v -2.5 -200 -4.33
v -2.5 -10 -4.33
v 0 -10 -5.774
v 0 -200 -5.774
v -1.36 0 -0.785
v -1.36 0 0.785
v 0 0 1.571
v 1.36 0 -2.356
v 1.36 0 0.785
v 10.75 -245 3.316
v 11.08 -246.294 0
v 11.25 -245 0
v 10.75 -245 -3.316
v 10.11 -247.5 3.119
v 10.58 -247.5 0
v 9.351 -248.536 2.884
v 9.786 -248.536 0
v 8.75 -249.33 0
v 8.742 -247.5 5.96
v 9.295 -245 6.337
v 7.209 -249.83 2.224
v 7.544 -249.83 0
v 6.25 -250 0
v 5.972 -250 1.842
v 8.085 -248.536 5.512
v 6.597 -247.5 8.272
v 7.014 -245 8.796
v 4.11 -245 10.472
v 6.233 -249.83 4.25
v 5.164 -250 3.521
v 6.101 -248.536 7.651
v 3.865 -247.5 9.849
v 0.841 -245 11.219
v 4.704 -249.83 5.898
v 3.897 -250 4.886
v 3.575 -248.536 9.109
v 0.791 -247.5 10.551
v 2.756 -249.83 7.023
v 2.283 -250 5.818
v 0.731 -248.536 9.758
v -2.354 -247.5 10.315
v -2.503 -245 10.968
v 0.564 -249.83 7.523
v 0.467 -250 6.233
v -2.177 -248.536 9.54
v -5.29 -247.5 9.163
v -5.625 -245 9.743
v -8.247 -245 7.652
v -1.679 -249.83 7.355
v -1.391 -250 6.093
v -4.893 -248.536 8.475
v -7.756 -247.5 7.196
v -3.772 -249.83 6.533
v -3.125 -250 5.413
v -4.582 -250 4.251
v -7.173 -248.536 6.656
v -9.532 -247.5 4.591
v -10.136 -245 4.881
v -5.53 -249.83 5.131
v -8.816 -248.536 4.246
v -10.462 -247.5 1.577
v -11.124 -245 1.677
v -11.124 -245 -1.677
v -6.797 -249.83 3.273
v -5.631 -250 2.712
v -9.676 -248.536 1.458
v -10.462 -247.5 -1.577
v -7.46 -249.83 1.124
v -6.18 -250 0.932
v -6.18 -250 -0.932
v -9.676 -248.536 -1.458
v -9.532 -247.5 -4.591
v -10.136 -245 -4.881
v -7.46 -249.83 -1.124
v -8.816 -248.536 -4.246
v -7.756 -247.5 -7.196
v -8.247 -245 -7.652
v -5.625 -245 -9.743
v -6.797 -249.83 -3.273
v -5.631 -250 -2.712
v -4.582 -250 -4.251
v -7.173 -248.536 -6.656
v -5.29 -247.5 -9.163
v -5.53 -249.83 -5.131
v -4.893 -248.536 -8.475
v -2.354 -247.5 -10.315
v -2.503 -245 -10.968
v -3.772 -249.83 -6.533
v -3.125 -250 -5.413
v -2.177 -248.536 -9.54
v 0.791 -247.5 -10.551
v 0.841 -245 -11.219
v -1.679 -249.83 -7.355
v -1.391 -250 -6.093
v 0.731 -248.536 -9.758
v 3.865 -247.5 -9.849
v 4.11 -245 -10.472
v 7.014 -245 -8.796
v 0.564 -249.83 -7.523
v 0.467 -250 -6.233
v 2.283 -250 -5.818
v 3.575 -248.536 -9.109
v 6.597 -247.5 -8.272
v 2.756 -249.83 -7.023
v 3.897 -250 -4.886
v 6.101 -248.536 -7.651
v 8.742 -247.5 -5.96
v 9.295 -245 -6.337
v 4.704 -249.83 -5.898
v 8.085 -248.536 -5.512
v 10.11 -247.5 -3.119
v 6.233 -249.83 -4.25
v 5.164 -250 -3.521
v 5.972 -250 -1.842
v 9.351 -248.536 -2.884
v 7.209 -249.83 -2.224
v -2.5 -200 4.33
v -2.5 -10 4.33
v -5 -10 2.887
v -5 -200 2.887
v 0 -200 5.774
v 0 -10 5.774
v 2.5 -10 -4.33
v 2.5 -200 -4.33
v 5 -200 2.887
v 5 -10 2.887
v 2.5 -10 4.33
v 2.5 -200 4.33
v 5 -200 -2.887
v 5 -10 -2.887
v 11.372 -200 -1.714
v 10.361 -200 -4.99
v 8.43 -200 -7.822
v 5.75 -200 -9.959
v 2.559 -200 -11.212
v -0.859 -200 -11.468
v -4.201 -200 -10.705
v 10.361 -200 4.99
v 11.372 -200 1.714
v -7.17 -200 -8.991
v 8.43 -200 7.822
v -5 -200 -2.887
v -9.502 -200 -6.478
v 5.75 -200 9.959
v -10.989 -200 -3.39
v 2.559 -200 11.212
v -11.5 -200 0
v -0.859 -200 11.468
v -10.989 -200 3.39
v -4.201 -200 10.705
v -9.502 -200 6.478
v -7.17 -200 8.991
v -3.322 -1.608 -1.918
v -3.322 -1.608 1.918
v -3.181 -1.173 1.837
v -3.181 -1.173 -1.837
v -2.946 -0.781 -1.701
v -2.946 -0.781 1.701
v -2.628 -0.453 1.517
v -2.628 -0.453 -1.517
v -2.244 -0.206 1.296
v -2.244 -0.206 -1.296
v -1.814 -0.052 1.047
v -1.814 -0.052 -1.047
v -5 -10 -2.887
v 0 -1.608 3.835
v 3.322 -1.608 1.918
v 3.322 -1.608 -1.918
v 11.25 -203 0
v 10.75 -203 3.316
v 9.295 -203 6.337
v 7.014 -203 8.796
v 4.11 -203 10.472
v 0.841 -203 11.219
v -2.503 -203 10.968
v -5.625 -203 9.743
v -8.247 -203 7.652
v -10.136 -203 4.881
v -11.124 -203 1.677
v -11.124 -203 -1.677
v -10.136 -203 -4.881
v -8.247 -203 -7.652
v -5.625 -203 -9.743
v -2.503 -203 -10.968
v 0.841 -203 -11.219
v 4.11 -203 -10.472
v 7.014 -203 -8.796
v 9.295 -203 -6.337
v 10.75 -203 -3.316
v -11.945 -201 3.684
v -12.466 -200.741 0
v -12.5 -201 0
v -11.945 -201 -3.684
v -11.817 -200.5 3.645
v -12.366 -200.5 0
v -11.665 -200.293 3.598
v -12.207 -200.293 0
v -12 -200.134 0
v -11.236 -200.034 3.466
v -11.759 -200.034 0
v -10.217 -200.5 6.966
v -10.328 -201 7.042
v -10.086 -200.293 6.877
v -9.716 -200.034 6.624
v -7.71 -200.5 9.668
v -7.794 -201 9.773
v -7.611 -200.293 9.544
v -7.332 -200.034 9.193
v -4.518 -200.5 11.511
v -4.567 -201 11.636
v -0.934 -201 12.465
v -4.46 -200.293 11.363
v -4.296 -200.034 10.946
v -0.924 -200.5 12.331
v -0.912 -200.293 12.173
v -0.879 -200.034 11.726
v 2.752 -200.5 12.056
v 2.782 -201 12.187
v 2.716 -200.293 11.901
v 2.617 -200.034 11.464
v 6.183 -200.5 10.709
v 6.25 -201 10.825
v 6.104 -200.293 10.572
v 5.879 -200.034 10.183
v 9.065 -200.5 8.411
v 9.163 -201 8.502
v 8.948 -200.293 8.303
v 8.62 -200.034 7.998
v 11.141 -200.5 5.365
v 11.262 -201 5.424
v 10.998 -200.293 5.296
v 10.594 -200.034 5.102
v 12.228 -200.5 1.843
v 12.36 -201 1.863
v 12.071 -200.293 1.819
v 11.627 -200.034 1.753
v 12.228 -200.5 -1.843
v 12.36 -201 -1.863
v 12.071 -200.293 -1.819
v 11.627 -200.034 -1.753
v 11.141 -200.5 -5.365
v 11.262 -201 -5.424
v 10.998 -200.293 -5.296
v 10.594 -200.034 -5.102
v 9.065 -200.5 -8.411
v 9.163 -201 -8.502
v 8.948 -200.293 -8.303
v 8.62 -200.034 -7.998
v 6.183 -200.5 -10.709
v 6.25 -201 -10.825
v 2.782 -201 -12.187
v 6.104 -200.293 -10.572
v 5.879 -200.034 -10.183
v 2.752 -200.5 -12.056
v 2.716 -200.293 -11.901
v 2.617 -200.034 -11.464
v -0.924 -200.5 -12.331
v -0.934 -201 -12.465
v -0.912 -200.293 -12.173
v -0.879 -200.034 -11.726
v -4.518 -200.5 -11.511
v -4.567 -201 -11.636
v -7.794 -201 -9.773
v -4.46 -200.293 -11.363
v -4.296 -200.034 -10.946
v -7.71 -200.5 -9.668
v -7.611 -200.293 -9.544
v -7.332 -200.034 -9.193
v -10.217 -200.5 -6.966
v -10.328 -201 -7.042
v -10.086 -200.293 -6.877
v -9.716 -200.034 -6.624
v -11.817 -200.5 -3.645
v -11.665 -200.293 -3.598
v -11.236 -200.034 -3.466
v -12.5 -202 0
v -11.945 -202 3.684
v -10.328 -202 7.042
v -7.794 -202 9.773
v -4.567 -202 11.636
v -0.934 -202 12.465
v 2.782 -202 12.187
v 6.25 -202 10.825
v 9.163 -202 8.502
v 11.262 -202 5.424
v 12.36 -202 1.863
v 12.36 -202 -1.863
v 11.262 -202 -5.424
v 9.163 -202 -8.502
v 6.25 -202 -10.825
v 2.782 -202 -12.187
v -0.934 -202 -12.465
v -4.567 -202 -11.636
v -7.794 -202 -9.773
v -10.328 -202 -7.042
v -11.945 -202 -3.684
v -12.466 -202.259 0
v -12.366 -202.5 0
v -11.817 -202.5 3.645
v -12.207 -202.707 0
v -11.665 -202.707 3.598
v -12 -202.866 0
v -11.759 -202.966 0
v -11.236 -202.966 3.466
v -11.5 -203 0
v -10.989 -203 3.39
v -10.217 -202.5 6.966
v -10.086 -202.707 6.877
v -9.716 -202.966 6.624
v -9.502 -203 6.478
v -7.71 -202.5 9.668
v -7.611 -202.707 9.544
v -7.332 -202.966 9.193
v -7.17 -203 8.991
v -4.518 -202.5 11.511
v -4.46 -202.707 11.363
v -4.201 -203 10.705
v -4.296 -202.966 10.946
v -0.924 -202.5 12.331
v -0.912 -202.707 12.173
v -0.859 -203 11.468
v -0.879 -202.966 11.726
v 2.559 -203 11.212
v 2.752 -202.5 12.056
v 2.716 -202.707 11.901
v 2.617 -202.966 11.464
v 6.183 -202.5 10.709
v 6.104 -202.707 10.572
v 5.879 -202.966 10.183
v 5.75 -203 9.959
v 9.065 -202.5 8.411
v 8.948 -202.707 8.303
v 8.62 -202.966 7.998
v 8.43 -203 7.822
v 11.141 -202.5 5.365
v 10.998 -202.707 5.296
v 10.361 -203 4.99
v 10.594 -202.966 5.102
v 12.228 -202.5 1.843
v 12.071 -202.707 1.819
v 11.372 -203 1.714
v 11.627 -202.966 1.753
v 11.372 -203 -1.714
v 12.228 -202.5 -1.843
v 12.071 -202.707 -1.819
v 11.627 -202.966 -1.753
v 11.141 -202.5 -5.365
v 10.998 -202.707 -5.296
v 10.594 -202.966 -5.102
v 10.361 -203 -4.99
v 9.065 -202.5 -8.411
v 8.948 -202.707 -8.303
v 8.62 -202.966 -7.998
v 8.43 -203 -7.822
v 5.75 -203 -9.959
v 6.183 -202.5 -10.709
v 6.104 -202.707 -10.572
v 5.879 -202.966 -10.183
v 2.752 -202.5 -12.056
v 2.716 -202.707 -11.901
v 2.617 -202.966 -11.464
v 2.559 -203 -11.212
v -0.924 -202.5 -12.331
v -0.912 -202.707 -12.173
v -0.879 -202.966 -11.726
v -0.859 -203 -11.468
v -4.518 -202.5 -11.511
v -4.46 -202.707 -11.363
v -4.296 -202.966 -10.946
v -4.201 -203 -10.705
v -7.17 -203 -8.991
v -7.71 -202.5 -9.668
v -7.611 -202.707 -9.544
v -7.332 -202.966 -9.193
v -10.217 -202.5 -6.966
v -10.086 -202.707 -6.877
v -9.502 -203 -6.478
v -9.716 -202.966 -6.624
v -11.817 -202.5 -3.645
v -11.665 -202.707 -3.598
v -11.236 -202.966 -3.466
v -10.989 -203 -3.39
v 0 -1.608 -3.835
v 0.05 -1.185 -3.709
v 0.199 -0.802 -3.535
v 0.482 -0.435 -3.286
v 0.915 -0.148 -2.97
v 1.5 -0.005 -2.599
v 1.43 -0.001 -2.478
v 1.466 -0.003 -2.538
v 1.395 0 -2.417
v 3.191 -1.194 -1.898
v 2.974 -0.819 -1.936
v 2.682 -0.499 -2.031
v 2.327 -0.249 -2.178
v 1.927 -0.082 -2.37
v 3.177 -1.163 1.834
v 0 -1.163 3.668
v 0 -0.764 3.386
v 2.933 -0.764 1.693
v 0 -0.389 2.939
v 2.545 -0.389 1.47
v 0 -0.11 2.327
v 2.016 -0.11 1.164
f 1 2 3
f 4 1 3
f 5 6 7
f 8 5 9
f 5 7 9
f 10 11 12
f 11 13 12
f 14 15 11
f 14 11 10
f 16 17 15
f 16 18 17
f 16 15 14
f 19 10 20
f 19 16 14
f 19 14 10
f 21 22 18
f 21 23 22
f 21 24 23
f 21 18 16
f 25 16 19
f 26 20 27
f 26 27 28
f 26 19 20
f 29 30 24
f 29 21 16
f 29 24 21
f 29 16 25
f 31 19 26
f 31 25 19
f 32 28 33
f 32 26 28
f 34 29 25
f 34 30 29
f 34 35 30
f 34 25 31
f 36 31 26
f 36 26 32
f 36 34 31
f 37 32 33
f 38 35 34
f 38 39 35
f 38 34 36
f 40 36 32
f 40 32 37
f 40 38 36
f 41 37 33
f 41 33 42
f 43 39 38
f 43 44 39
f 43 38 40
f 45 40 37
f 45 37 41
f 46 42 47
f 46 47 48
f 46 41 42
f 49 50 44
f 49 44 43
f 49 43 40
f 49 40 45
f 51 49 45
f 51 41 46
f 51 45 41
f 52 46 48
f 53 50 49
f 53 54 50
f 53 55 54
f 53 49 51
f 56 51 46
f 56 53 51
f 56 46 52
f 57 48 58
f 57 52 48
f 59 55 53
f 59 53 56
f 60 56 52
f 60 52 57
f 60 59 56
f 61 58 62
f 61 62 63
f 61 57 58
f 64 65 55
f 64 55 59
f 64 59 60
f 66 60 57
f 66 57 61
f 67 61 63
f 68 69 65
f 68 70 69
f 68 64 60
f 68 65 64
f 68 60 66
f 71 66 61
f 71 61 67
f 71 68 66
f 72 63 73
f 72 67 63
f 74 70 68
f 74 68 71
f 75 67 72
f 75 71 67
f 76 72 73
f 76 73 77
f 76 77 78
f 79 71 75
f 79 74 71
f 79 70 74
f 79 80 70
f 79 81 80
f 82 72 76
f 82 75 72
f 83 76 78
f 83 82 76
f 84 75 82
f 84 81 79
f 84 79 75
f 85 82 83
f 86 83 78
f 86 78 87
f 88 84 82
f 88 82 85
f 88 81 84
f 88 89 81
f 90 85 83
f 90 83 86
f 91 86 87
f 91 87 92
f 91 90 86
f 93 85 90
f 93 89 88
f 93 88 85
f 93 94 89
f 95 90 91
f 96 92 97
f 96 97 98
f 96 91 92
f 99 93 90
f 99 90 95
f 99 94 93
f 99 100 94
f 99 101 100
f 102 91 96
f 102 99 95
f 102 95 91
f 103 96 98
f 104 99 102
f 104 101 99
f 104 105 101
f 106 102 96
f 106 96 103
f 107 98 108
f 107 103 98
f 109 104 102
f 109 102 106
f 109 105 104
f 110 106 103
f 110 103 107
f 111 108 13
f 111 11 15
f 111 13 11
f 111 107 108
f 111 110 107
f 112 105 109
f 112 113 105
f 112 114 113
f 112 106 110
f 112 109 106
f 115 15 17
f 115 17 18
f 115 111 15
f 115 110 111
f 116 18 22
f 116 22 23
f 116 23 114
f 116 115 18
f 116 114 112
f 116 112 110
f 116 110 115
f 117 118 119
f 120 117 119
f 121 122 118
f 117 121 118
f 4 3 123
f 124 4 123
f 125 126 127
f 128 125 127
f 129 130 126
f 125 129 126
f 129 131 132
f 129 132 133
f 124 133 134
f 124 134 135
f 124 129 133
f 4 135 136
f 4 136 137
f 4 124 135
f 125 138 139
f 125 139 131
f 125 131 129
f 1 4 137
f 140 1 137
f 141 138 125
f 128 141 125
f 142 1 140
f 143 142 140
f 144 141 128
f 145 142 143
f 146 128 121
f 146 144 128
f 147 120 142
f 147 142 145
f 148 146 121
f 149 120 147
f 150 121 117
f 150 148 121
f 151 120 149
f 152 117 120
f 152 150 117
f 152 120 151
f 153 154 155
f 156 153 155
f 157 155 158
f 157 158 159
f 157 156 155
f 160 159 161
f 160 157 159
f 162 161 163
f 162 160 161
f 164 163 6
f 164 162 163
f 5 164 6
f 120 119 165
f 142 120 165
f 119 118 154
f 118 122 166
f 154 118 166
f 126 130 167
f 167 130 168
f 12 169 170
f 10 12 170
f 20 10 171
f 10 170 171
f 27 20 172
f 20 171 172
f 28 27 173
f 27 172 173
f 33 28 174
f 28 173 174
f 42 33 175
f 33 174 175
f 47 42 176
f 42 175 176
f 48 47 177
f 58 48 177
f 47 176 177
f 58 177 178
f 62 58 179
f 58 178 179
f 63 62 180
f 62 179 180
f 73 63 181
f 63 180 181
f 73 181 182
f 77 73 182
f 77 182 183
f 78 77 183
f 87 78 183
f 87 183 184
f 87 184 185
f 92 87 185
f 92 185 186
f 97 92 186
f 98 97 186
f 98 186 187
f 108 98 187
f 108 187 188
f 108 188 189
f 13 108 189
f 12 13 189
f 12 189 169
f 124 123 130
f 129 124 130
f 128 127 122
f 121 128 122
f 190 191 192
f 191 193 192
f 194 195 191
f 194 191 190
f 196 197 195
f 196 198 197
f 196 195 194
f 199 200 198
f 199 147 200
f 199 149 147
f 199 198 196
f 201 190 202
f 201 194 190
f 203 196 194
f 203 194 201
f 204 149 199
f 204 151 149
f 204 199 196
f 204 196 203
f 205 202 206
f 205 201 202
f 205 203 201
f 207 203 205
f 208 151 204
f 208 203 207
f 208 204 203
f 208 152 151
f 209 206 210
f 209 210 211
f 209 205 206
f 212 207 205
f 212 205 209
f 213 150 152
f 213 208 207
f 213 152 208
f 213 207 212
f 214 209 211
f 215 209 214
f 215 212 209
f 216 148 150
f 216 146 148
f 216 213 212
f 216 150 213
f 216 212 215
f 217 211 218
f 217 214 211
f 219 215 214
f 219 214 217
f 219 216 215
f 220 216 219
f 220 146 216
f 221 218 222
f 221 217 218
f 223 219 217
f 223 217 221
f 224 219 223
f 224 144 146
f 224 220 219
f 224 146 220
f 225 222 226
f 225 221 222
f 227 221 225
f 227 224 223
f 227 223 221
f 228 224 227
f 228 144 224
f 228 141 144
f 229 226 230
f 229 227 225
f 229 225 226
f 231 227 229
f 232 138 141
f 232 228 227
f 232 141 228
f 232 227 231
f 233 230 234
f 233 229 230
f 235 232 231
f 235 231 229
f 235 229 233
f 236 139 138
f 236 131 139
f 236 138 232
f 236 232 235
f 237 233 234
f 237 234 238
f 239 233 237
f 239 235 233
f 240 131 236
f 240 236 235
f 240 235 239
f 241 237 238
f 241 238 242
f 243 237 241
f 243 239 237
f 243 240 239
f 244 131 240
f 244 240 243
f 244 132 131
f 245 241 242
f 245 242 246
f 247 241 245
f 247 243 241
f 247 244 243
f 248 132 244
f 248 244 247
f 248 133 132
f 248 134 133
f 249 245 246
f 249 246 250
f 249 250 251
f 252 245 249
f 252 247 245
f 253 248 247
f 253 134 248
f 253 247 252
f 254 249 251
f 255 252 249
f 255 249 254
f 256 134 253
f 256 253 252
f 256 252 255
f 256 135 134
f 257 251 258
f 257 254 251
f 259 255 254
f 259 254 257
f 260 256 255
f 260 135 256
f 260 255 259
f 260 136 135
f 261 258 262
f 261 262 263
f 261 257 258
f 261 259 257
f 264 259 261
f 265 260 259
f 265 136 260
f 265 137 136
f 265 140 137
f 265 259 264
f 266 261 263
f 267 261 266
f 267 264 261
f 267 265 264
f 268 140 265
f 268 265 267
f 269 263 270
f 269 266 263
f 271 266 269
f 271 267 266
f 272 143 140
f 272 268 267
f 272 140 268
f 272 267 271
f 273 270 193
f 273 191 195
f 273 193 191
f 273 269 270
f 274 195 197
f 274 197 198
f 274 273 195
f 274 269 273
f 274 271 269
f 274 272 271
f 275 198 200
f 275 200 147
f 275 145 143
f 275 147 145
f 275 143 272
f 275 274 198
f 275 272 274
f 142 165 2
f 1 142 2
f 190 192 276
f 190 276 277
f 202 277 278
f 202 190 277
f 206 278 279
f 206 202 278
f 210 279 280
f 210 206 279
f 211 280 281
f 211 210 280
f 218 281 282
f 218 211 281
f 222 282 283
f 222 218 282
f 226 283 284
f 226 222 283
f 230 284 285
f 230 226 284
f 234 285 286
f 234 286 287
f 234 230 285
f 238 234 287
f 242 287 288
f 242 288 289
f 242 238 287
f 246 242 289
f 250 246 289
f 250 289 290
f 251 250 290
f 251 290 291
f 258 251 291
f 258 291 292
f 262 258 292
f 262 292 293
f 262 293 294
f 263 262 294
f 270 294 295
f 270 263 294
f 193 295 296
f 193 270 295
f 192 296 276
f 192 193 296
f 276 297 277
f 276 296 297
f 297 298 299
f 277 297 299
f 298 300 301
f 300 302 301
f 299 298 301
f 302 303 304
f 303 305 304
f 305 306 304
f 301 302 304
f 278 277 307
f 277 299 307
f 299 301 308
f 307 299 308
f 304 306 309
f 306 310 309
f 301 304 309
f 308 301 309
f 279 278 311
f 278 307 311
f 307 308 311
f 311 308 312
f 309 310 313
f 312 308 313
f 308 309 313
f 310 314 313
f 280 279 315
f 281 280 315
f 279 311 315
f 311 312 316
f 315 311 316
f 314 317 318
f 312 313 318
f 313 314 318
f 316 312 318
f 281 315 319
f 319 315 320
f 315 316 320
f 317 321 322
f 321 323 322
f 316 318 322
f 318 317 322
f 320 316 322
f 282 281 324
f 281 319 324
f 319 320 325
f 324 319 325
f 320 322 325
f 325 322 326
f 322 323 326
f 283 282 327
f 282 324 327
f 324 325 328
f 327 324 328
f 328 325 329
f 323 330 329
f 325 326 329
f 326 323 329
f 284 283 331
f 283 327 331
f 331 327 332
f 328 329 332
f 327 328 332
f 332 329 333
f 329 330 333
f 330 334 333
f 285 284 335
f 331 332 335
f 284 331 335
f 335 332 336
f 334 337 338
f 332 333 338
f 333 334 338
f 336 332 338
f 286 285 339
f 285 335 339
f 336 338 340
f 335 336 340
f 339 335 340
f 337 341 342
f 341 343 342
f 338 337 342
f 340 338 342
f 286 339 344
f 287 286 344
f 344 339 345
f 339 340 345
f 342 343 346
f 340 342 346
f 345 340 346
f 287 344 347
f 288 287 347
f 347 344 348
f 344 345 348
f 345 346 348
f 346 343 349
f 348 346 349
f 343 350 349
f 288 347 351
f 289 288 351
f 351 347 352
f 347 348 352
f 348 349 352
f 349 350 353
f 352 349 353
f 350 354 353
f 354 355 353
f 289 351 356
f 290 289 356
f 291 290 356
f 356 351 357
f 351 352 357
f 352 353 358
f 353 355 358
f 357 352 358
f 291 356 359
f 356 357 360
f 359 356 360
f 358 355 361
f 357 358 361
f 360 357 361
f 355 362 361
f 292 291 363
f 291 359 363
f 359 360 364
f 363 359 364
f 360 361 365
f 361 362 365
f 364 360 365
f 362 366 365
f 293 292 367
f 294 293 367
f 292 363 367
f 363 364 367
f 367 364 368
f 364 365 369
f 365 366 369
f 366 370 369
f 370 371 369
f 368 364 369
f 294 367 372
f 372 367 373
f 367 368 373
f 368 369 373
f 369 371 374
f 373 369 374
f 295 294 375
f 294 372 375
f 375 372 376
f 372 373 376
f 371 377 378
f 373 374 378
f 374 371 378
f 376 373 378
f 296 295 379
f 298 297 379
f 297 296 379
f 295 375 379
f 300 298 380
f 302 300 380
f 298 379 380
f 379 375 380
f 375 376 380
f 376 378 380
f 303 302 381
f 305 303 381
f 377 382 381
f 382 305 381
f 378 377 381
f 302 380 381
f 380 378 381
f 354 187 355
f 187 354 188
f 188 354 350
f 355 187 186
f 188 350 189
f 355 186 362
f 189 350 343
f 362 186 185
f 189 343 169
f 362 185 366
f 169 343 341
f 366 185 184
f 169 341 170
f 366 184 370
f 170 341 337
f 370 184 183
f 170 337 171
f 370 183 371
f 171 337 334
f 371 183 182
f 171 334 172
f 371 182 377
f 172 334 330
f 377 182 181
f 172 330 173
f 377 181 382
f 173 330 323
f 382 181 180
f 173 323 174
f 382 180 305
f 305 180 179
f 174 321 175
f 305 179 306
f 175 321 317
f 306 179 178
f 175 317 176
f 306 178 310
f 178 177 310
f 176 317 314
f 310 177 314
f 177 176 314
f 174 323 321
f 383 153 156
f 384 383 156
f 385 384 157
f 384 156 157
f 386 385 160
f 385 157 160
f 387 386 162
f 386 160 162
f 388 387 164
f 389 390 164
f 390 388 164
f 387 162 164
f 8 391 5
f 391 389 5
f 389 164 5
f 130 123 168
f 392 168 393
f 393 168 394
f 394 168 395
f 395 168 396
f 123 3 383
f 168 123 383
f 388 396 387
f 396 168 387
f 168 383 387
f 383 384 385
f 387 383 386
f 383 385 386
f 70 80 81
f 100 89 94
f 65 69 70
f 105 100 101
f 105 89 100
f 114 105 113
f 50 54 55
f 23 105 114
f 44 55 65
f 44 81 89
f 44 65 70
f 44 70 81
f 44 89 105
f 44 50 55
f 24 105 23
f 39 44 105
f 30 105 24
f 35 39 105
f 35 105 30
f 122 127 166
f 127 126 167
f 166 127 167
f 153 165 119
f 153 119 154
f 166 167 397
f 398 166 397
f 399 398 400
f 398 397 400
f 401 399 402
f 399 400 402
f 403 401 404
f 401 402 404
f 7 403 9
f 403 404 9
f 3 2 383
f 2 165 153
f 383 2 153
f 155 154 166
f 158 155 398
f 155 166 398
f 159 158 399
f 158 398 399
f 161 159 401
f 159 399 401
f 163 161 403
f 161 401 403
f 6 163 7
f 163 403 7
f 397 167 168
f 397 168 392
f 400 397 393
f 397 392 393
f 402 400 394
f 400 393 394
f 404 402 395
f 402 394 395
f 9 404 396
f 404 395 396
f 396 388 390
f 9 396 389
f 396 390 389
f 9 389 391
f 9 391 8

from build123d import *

# Parameters (mm, degrees)
F1_DEPTH    = 200
F2_R        = 11.25
F3_DEPTH    = 50
F4_R        = 12.5
F5_DEPTH    = 3
F6_R        = 1
F7_R        = 5
F8_T1_DEPTH = 57.7361444178
F8_T3_DEPTH = 57.7361444178
F8_T5_DEPTH = 57.7361444178
F8_T7_DEPTH = 57.7361444178
F8_T9_DEPTH = 57.7361444178
F9_T1_DEPTH = 11.6621406423
F9_T3_DEPTH = 11.6621406423
F9_T5_DEPTH = 11.6621406423
F9_T7_DEPTH = 11.6621406423


# Not quite as in the source:
# - a fillet or chamfer that OpenCascade refuses, or shapes differently, is made with other operations: its cross-section is extruded or revolved along the edge and cut away or added


with BuildPart() as f1:
    # F0 (on Front) → F1 (new body)
    with BuildSketch(Plane.XZ):
        with BuildLine():
            ThreePointArc((2.5000000636, -4.3301269822), (4.3301270373, -2.4999999682), (5, 0))
            ThreePointArc((5, 0), (4.3301270373, 2.4999999682), (2.5000000636, 4.3301269822))
            ThreePointArc((2.5000000636, 4.3301269822), (1.215e-07, 5), (-2.4999998532, 4.3301271037))
            ThreePointArc((-2.4999998532, 4.3301271037), (-4.3301269765, 2.5000000734), (-5, 0))
            ThreePointArc((-5, 0), (-4.3301270351, -2.4999999721), (-2.5000000559, -4.3301269867))
            ThreePointArc((-2.5000000559, -4.3301269867), (4.5e-09, -5), (2.5000000636, -4.3301269822))
        make_face()
        with BuildLine():
            Line((5, -2.8867513459), (5, 0))
            ThreePointArc((5, 0), (4.3301270373, -2.4999999682), (2.5000000636, -4.3301269822))
            Line((2.5000000636, -4.3301269822), (5, -2.8867513459))
        make_face()
        with BuildLine():
            ThreePointArc((2.5000000636, 4.3301269822), (4.3301270373, 2.4999999682), (5, 0))
            Line((5, 0), (5, 2.8867513459))
            Line((5, 2.8867513459), (2.5000000636, 4.3301269822))
        make_face()
        with BuildLine():
            ThreePointArc((-2.4999998532, 4.3301271037), (1.215e-07, 5), (2.5000000636, 4.3301269822))
            Line((2.5000000636, 4.3301269822), (0, 5.7735026919))
            Line((0, 5.7735026919), (-2.4999998532, 4.3301271037))
        make_face()
        with BuildLine():
            Line((0, -5.7735026919), (2.5000000636, -4.3301269822))
            ThreePointArc((2.5000000636, -4.3301269822), (4.5e-09, -5), (-2.5000000559, -4.3301269867))
            Line((-2.5000000559, -4.3301269867), (0, -5.7735026919))
        make_face()
        with BuildLine():
            ThreePointArc((-5, 0), (-4.3301269765, 2.5000000734), (-2.4999998532, 4.3301271037))
            Line((-2.4999998532, 4.3301271037), (-5, 2.8867513459))
            Line((-5, 2.8867513459), (-5, 0))
        make_face()
        with BuildLine():
            Line((-5, -2.8867513459), (-2.5000000559, -4.3301269867))
            ThreePointArc((-2.5000000559, -4.3301269867), (-4.3301270351, -2.4999999721), (-5, 0))
            Line((-5, 0), (-5, -2.8867513459))
        make_face()
    extrude(amount=F1_DEPTH)

    # F2 (on face) → F3 (join)
    with BuildSketch(Plane.XZ.offset(200)):
        Circle(F2_R)
    extrude(amount=F3_DEPTH)

    # F4 (on face) → F5 (join)
    with BuildSketch(Plane(origin=(0, -200, 0), x_dir=(-1, 0, 0), z_dir=(0, 1, 0))):
        Circle(F4_R)
    extrude(amount=-F5_DEPTH)

    # F6
    f6_edges = [f1.edges().sort_by_distance(p)[0] for p in [
        (12.5, -203, 0),
        (12.5, -200, 0),
    ]]
    fillet(f6_edges, radius=F6_R)

    # F7
    f7_edges = [f1.edges().sort_by_distance(p)[0] for p in [
        (-11.25, -250, 0),
    ]]
    fillet(f7_edges, radius=F7_R)

    # F8: chamfer of 2 x 10 on 6 edges, made by hand

    # F8_s2 → F8_t1 (cut)
    with BuildSketch(Plane.XY.offset(-28.8680722089)):
        Polygon((5, -10), (3, 0), (5, 0), align=None)
        Polygon((-5, -10), (-3, 0), (-5, 0), align=None)
    extrude(amount=F8_T1_DEPTH, mode=Mode.SUBTRACT)

    # F8_s4 → F8_t3 (cut)
    with BuildSketch(Plane(origin=(25.0004838912, 0, -14.4340361045), x_dir=(0, 1, 0), z_dir=(-0.8660254038, 0, 0.5))):
        Polygon((-10, -5), (0, -3), (0, -5), align=None)
    extrude(amount=F8_T3_DEPTH, mode=Mode.SUBTRACT)

    # F8_s6 → F8_t5 (cut)
    with BuildSketch(Plane(origin=(25.0004838912, 0, 14.4340361045), x_dir=(0, 1, 0), z_dir=(-0.8660254038, 0, -0.5))):
        Polygon((-10, -5), (0, -3), (0, -5), align=None)
    extrude(amount=F8_T5_DEPTH, mode=Mode.SUBTRACT)

    # F8_s8 → F8_t7 (cut)
    with BuildSketch(Plane(origin=(-25.0004838912, 0, 14.4340361045), x_dir=(0, 1, 0), z_dir=(0.8660254038, 0, -0.5))):
        Polygon((-10, -5), (0, -3), (0, -5), align=None)
    extrude(amount=F8_T7_DEPTH, mode=Mode.SUBTRACT)

    # F8_s10 → F8_t9 (cut)
    with BuildSketch(Plane(origin=(-25.0004838912, 0, -14.4340361045), x_dir=(0, 1, 0), z_dir=(0.8660254038, 0, 0.5))):
        Polygon((-10, -5), (0, -3), (0, -5), align=None)
    extrude(amount=F8_T9_DEPTH, mode=Mode.SUBTRACT)

    # F9: fillet of radius 2 on 5 edges, made by hand

    # F9_s2 → F9_t1 (cut)
    with BuildSketch(Plane.XY.offset(-5.8310703212)):
        with BuildLine():
            ThreePointArc((3.3215535459, -1.6077677297), (2.6283700058, -0.4533157173), (1.3603921946, 0))
            Line((1.3603921946, 0), (3, 0))
            Line((3, 0), (3.3215535459, -1.6077677297))
        make_face()
        with BuildLine():
            ThreePointArc((-3.3215535459, -1.6077677297), (-2.6283700058, -0.4533157173), (-1.3603921946, 0))
            Line((-1.3603921946, 0), (-3, 0))
            Line((-3, 0), (-3.3215535459, -1.6077677297))
        make_face()
    extrude(amount=F9_T1_DEPTH, mode=Mode.SUBTRACT)

    # F9_s4 → F9_t3 (cut)
    with BuildSketch(Plane(origin=(5.0498550294, 0, 2.9155351606), x_dir=(0, 1, 0), z_dir=(-0.8660254038, 0, -0.5))):
        with BuildLine():
            ThreePointArc((-1.6077677297, -3.3215535459), (-0.4533157173, -2.6283700058), (0, -1.3603921946))
            Line((0, -1.3603921946), (0, -3))
            Line((0, -3), (-1.6077677297, -3.3215535459))
        make_face()
    extrude(amount=F9_T3_DEPTH, mode=Mode.SUBTRACT)

    # F9_s6 → F9_t5 (cut)
    with BuildSketch(Plane(origin=(-5.0498550294, 0, 2.9155351606), x_dir=(0, 1, 0), z_dir=(0.8660254038, 0, -0.5))):
        with BuildLine():
            ThreePointArc((-1.6077677297, -3.3215535459), (-0.4533157173, -2.6283700058), (0, -1.3603921946))
            Line((0, -1.3603921946), (0, -3))
            Line((0, -3), (-1.6077677297, -3.3215535459))
        make_face()
    extrude(amount=F9_T5_DEPTH, mode=Mode.SUBTRACT)

    # F9_s8 → F9_t7 (cut)
    with BuildSketch(Plane(origin=(5.0498550294, 0, -2.9155351606), x_dir=(0, 1, 0), z_dir=(-0.8660254038, 0, 0.5))):
        with BuildLine():
            ThreePointArc((-1.6077677297, -3.3215535459), (-0.4533157173, -2.6283700058), (0, -1.3603921946))
            Line((0, -1.3603921946), (0, -3))
            Line((0, -3), (-1.6077677297, -3.3215535459))
        make_face()
    extrude(amount=F9_T7_DEPTH, mode=Mode.SUBTRACT)


solid = f1.part
